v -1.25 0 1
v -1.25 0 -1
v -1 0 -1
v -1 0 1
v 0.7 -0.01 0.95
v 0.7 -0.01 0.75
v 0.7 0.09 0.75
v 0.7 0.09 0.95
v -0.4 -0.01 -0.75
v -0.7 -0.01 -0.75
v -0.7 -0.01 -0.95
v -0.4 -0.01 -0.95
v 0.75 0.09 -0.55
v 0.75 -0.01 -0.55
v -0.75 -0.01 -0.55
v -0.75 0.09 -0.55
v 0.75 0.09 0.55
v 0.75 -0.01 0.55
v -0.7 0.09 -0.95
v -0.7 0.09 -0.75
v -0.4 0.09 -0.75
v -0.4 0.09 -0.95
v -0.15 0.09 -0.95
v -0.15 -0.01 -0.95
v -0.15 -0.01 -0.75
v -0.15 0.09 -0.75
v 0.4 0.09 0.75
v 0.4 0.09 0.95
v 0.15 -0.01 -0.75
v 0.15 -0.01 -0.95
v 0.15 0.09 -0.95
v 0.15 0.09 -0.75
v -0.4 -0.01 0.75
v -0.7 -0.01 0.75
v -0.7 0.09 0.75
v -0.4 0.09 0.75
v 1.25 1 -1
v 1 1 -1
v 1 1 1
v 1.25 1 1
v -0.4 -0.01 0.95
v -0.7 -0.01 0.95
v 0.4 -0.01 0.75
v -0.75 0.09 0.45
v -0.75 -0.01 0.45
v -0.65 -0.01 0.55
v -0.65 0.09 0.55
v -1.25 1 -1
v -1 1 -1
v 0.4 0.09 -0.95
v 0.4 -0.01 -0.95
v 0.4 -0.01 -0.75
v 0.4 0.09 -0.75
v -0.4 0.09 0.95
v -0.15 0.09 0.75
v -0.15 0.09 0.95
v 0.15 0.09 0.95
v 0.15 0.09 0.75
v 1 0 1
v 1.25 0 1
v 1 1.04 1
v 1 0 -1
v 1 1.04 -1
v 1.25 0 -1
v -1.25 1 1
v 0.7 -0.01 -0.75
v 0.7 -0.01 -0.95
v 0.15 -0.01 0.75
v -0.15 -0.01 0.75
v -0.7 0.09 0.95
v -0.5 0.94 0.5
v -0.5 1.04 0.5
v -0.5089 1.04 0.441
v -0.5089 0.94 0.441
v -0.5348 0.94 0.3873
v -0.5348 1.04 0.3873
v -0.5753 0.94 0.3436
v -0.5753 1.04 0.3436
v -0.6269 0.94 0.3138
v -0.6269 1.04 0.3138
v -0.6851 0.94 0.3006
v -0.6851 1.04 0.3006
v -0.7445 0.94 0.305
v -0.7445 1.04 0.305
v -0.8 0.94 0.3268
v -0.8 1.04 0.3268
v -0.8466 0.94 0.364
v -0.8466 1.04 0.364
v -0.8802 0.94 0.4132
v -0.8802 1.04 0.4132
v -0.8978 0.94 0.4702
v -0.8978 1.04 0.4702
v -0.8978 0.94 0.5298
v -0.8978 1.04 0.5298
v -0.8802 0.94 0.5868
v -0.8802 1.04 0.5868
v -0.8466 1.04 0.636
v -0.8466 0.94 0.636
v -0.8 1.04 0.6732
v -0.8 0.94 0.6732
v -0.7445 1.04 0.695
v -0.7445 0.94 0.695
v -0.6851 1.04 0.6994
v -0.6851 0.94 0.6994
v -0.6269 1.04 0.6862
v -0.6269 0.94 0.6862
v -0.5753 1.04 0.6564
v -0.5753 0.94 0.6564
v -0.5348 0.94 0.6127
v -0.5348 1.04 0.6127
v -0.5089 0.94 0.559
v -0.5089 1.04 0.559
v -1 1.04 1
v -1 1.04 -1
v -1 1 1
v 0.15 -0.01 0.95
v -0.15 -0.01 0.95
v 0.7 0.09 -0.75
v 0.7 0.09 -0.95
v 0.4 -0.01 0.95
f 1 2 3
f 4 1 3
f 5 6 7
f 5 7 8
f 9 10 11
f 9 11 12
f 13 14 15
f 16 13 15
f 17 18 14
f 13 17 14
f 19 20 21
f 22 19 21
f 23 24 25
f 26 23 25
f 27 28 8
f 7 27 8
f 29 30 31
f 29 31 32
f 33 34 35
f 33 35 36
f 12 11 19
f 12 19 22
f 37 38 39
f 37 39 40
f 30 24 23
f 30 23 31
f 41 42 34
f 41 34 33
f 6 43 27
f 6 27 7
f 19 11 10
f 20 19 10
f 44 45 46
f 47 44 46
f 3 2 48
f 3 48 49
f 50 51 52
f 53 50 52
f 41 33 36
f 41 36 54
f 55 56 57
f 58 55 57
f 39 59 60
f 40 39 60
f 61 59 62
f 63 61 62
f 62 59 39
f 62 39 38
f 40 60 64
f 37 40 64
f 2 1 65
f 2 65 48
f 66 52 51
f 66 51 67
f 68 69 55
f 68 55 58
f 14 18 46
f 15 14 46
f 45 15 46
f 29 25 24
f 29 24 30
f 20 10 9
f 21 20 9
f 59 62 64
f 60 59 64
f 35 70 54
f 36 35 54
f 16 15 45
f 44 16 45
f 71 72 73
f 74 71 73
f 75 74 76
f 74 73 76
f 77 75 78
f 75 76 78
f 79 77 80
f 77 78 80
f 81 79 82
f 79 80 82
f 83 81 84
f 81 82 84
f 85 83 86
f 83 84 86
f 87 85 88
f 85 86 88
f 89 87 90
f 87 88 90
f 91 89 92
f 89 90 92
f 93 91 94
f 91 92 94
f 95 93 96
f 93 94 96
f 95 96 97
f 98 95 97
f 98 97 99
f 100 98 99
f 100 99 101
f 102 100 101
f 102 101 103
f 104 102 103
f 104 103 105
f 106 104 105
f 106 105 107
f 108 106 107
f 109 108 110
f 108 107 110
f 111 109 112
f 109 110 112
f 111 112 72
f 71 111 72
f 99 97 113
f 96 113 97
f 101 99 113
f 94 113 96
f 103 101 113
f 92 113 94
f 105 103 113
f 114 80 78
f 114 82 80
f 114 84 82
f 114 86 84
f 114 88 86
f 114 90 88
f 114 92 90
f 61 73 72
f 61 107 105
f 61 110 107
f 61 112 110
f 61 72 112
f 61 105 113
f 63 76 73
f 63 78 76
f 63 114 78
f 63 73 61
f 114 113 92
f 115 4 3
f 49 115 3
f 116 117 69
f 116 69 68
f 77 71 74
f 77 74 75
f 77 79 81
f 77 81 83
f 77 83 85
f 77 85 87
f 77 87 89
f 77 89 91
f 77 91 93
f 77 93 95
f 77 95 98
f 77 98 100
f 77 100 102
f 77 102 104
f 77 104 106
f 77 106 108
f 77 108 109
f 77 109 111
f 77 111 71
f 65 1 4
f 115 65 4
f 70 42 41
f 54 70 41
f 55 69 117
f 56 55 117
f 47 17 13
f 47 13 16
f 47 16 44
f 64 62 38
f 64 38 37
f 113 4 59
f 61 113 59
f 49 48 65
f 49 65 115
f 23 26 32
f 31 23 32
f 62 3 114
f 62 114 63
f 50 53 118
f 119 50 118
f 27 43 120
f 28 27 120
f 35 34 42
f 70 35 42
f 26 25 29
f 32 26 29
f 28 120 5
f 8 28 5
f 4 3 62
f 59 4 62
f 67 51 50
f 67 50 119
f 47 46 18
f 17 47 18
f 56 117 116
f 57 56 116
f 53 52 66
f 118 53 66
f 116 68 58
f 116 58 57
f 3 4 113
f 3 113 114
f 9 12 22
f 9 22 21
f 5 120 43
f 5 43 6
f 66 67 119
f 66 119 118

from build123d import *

# Parameters (mm, degrees)
SKETCH1_W             = 2
SKETCH1_H             = 2
BOSS_EXTRUDE1_DEPTH   = 1.04
SKETCH3_W             = 0.25
SKETCH3_H             = 2
BOSS_EXTRUDE2_DEPTH   = 1
BOSS_EXTRUDE2_2_DEPTH = 1
SKETCH4_R             = 0.2
CUT_EXTRUDE1_DEPTH    = 0.1
BOSS_EXTRUDE3_START   = 0.01
BOSS_EXTRUDE3_DEPTH   = 0.1
SKETCH5_W             = 0.3
SKETCH5_H             = 0.2
BOSS_EXTRUDE3_2_DEPTH = 0.1
BOSS_EXTRUDE3_3_DEPTH = 0.1
BOSS_EXTRUDE3_4_DEPTH = 0.1
BOSS_EXTRUDE3_5_DEPTH = 0.1
BOSS_EXTRUDE3_6_DEPTH = 0.1
BOSS_EXTRUDE3_7_DEPTH = 0.1


with BuildPart() as part:
    # Sketch1 → Boss-Extrude1 (new body)
    with BuildSketch(Plane(origin=(0, 0, 0), x_dir=(1, 0, 0), z_dir=(0, 1, 0))):
        Rectangle(SKETCH1_W, SKETCH1_H)
    extrude(amount=BOSS_EXTRUDE1_DEPTH)

    # Sketch4 → Cut-Extrude1 (cut)
    with BuildSketch(Plane(origin=(0, 1.04, 0), x_dir=(1, 0, 0), z_dir=(0, 1, 0))):
        with Locations((-0.7, -0.5)):
            Circle(SKETCH4_R)
    extrude(amount=-CUT_EXTRUDE1_DEPTH, mode=Mode.SUBTRACT)


with BuildPart() as body_2:
    # Sketch3 → Boss-Extrude2 (new body)
    with BuildSketch(Plane(origin=(0, 0, 0), x_dir=(1, 0, 0), z_dir=(0, 1, 0))):
        with Locations((-1.125, 0)):
            Rectangle(SKETCH3_W, SKETCH3_H)
    extrude(amount=BOSS_EXTRUDE2_DEPTH)


with BuildPart() as body_3:
    # Sketch3 → Boss-Extrude2 2 (new body)
    with BuildSketch(Plane(origin=(0, 0, 0), x_dir=(1, 0, 0), z_dir=(0, 1, 0))):
        with Locations((1.125, 0)):
            Rectangle(SKETCH3_W, SKETCH3_H)
    extrude(amount=BOSS_EXTRUDE2_2_DEPTH)


with BuildPart() as body_4:
    # Sketch5 → Boss-Extrude3 (new body)
    with BuildSketch(Plane.XZ.offset(BOSS_EXTRUDE3_START)):
        Polygon((-0.75, 0.45), (-0.65, 0.55), (0.75, 0.55), (0.75, -0.55), (-0.75, -0.55), align=None)
    extrude(amount=-BOSS_EXTRUDE3_DEPTH)


with BuildPart() as body_5:
    # Sketch5 → Boss-Extrude3 2 (new body)
    with BuildSketch(Plane.XZ.offset(BOSS_EXTRUDE3_START)):
        with Locations((0.55, -0.85)):
            Rectangle(SKETCH5_W, SKETCH5_H)
    extrude(amount=-BOSS_EXTRUDE3_2_DEPTH)


with BuildPart() as body_6:
    # Sketch5 → Boss-Extrude3 3 (new body)
    with BuildSketch(Plane.XZ.offset(BOSS_EXTRUDE3_START)):
        with Locations((0, -0.85)):
            Rectangle(SKETCH5_W, SKETCH5_H)
    extrude(amount=-BOSS_EXTRUDE3_3_DEPTH)


with BuildPart() as body_7:
    # Sketch5 → Boss-Extrude3 4 (new body)
    with BuildSketch(Plane.XZ.offset(BOSS_EXTRUDE3_START)):
        with Locations((-0.55, -0.85)):
            Rectangle(SKETCH5_W, SKETCH5_H)
    extrude(amount=-BOSS_EXTRUDE3_4_DEPTH)


with BuildPart() as body_8:
    # Sketch5 → Boss-Extrude3 5 (new body)
    with BuildSketch(Plane.XZ.offset(BOSS_EXTRUDE3_START)):
        with Locations((-0.55, 0.85)):
            Rectangle(SKETCH5_W, SKETCH5_H)
    extrude(amount=-BOSS_EXTRUDE3_5_DEPTH)


with BuildPart() as body_9:
    # Sketch5 → Boss-Extrude3 6 (new body)
    with BuildSketch(Plane.XZ.offset(BOSS_EXTRUDE3_START)):
        with Locations((0.55, 0.85)):
            Rectangle(SKETCH5_W, SKETCH5_H)
    extrude(amount=-BOSS_EXTRUDE3_6_DEPTH)


with BuildPart() as body_10:
    # Sketch5 → Boss-Extrude3 7 (new body)
    with BuildSketch(Plane.XZ.offset(BOSS_EXTRUDE3_START)):
        with Locations((0, 0.85)):
            Rectangle(SKETCH5_W, SKETCH5_H)
    extrude(amount=-BOSS_EXTRUDE3_7_DEPTH)


solid = Compound([part.part, body_2.part, body_3.part, body_4.part, body_5.part, body_6.part, body_7.part, body_8.part, body_9.part, body_10.part])
